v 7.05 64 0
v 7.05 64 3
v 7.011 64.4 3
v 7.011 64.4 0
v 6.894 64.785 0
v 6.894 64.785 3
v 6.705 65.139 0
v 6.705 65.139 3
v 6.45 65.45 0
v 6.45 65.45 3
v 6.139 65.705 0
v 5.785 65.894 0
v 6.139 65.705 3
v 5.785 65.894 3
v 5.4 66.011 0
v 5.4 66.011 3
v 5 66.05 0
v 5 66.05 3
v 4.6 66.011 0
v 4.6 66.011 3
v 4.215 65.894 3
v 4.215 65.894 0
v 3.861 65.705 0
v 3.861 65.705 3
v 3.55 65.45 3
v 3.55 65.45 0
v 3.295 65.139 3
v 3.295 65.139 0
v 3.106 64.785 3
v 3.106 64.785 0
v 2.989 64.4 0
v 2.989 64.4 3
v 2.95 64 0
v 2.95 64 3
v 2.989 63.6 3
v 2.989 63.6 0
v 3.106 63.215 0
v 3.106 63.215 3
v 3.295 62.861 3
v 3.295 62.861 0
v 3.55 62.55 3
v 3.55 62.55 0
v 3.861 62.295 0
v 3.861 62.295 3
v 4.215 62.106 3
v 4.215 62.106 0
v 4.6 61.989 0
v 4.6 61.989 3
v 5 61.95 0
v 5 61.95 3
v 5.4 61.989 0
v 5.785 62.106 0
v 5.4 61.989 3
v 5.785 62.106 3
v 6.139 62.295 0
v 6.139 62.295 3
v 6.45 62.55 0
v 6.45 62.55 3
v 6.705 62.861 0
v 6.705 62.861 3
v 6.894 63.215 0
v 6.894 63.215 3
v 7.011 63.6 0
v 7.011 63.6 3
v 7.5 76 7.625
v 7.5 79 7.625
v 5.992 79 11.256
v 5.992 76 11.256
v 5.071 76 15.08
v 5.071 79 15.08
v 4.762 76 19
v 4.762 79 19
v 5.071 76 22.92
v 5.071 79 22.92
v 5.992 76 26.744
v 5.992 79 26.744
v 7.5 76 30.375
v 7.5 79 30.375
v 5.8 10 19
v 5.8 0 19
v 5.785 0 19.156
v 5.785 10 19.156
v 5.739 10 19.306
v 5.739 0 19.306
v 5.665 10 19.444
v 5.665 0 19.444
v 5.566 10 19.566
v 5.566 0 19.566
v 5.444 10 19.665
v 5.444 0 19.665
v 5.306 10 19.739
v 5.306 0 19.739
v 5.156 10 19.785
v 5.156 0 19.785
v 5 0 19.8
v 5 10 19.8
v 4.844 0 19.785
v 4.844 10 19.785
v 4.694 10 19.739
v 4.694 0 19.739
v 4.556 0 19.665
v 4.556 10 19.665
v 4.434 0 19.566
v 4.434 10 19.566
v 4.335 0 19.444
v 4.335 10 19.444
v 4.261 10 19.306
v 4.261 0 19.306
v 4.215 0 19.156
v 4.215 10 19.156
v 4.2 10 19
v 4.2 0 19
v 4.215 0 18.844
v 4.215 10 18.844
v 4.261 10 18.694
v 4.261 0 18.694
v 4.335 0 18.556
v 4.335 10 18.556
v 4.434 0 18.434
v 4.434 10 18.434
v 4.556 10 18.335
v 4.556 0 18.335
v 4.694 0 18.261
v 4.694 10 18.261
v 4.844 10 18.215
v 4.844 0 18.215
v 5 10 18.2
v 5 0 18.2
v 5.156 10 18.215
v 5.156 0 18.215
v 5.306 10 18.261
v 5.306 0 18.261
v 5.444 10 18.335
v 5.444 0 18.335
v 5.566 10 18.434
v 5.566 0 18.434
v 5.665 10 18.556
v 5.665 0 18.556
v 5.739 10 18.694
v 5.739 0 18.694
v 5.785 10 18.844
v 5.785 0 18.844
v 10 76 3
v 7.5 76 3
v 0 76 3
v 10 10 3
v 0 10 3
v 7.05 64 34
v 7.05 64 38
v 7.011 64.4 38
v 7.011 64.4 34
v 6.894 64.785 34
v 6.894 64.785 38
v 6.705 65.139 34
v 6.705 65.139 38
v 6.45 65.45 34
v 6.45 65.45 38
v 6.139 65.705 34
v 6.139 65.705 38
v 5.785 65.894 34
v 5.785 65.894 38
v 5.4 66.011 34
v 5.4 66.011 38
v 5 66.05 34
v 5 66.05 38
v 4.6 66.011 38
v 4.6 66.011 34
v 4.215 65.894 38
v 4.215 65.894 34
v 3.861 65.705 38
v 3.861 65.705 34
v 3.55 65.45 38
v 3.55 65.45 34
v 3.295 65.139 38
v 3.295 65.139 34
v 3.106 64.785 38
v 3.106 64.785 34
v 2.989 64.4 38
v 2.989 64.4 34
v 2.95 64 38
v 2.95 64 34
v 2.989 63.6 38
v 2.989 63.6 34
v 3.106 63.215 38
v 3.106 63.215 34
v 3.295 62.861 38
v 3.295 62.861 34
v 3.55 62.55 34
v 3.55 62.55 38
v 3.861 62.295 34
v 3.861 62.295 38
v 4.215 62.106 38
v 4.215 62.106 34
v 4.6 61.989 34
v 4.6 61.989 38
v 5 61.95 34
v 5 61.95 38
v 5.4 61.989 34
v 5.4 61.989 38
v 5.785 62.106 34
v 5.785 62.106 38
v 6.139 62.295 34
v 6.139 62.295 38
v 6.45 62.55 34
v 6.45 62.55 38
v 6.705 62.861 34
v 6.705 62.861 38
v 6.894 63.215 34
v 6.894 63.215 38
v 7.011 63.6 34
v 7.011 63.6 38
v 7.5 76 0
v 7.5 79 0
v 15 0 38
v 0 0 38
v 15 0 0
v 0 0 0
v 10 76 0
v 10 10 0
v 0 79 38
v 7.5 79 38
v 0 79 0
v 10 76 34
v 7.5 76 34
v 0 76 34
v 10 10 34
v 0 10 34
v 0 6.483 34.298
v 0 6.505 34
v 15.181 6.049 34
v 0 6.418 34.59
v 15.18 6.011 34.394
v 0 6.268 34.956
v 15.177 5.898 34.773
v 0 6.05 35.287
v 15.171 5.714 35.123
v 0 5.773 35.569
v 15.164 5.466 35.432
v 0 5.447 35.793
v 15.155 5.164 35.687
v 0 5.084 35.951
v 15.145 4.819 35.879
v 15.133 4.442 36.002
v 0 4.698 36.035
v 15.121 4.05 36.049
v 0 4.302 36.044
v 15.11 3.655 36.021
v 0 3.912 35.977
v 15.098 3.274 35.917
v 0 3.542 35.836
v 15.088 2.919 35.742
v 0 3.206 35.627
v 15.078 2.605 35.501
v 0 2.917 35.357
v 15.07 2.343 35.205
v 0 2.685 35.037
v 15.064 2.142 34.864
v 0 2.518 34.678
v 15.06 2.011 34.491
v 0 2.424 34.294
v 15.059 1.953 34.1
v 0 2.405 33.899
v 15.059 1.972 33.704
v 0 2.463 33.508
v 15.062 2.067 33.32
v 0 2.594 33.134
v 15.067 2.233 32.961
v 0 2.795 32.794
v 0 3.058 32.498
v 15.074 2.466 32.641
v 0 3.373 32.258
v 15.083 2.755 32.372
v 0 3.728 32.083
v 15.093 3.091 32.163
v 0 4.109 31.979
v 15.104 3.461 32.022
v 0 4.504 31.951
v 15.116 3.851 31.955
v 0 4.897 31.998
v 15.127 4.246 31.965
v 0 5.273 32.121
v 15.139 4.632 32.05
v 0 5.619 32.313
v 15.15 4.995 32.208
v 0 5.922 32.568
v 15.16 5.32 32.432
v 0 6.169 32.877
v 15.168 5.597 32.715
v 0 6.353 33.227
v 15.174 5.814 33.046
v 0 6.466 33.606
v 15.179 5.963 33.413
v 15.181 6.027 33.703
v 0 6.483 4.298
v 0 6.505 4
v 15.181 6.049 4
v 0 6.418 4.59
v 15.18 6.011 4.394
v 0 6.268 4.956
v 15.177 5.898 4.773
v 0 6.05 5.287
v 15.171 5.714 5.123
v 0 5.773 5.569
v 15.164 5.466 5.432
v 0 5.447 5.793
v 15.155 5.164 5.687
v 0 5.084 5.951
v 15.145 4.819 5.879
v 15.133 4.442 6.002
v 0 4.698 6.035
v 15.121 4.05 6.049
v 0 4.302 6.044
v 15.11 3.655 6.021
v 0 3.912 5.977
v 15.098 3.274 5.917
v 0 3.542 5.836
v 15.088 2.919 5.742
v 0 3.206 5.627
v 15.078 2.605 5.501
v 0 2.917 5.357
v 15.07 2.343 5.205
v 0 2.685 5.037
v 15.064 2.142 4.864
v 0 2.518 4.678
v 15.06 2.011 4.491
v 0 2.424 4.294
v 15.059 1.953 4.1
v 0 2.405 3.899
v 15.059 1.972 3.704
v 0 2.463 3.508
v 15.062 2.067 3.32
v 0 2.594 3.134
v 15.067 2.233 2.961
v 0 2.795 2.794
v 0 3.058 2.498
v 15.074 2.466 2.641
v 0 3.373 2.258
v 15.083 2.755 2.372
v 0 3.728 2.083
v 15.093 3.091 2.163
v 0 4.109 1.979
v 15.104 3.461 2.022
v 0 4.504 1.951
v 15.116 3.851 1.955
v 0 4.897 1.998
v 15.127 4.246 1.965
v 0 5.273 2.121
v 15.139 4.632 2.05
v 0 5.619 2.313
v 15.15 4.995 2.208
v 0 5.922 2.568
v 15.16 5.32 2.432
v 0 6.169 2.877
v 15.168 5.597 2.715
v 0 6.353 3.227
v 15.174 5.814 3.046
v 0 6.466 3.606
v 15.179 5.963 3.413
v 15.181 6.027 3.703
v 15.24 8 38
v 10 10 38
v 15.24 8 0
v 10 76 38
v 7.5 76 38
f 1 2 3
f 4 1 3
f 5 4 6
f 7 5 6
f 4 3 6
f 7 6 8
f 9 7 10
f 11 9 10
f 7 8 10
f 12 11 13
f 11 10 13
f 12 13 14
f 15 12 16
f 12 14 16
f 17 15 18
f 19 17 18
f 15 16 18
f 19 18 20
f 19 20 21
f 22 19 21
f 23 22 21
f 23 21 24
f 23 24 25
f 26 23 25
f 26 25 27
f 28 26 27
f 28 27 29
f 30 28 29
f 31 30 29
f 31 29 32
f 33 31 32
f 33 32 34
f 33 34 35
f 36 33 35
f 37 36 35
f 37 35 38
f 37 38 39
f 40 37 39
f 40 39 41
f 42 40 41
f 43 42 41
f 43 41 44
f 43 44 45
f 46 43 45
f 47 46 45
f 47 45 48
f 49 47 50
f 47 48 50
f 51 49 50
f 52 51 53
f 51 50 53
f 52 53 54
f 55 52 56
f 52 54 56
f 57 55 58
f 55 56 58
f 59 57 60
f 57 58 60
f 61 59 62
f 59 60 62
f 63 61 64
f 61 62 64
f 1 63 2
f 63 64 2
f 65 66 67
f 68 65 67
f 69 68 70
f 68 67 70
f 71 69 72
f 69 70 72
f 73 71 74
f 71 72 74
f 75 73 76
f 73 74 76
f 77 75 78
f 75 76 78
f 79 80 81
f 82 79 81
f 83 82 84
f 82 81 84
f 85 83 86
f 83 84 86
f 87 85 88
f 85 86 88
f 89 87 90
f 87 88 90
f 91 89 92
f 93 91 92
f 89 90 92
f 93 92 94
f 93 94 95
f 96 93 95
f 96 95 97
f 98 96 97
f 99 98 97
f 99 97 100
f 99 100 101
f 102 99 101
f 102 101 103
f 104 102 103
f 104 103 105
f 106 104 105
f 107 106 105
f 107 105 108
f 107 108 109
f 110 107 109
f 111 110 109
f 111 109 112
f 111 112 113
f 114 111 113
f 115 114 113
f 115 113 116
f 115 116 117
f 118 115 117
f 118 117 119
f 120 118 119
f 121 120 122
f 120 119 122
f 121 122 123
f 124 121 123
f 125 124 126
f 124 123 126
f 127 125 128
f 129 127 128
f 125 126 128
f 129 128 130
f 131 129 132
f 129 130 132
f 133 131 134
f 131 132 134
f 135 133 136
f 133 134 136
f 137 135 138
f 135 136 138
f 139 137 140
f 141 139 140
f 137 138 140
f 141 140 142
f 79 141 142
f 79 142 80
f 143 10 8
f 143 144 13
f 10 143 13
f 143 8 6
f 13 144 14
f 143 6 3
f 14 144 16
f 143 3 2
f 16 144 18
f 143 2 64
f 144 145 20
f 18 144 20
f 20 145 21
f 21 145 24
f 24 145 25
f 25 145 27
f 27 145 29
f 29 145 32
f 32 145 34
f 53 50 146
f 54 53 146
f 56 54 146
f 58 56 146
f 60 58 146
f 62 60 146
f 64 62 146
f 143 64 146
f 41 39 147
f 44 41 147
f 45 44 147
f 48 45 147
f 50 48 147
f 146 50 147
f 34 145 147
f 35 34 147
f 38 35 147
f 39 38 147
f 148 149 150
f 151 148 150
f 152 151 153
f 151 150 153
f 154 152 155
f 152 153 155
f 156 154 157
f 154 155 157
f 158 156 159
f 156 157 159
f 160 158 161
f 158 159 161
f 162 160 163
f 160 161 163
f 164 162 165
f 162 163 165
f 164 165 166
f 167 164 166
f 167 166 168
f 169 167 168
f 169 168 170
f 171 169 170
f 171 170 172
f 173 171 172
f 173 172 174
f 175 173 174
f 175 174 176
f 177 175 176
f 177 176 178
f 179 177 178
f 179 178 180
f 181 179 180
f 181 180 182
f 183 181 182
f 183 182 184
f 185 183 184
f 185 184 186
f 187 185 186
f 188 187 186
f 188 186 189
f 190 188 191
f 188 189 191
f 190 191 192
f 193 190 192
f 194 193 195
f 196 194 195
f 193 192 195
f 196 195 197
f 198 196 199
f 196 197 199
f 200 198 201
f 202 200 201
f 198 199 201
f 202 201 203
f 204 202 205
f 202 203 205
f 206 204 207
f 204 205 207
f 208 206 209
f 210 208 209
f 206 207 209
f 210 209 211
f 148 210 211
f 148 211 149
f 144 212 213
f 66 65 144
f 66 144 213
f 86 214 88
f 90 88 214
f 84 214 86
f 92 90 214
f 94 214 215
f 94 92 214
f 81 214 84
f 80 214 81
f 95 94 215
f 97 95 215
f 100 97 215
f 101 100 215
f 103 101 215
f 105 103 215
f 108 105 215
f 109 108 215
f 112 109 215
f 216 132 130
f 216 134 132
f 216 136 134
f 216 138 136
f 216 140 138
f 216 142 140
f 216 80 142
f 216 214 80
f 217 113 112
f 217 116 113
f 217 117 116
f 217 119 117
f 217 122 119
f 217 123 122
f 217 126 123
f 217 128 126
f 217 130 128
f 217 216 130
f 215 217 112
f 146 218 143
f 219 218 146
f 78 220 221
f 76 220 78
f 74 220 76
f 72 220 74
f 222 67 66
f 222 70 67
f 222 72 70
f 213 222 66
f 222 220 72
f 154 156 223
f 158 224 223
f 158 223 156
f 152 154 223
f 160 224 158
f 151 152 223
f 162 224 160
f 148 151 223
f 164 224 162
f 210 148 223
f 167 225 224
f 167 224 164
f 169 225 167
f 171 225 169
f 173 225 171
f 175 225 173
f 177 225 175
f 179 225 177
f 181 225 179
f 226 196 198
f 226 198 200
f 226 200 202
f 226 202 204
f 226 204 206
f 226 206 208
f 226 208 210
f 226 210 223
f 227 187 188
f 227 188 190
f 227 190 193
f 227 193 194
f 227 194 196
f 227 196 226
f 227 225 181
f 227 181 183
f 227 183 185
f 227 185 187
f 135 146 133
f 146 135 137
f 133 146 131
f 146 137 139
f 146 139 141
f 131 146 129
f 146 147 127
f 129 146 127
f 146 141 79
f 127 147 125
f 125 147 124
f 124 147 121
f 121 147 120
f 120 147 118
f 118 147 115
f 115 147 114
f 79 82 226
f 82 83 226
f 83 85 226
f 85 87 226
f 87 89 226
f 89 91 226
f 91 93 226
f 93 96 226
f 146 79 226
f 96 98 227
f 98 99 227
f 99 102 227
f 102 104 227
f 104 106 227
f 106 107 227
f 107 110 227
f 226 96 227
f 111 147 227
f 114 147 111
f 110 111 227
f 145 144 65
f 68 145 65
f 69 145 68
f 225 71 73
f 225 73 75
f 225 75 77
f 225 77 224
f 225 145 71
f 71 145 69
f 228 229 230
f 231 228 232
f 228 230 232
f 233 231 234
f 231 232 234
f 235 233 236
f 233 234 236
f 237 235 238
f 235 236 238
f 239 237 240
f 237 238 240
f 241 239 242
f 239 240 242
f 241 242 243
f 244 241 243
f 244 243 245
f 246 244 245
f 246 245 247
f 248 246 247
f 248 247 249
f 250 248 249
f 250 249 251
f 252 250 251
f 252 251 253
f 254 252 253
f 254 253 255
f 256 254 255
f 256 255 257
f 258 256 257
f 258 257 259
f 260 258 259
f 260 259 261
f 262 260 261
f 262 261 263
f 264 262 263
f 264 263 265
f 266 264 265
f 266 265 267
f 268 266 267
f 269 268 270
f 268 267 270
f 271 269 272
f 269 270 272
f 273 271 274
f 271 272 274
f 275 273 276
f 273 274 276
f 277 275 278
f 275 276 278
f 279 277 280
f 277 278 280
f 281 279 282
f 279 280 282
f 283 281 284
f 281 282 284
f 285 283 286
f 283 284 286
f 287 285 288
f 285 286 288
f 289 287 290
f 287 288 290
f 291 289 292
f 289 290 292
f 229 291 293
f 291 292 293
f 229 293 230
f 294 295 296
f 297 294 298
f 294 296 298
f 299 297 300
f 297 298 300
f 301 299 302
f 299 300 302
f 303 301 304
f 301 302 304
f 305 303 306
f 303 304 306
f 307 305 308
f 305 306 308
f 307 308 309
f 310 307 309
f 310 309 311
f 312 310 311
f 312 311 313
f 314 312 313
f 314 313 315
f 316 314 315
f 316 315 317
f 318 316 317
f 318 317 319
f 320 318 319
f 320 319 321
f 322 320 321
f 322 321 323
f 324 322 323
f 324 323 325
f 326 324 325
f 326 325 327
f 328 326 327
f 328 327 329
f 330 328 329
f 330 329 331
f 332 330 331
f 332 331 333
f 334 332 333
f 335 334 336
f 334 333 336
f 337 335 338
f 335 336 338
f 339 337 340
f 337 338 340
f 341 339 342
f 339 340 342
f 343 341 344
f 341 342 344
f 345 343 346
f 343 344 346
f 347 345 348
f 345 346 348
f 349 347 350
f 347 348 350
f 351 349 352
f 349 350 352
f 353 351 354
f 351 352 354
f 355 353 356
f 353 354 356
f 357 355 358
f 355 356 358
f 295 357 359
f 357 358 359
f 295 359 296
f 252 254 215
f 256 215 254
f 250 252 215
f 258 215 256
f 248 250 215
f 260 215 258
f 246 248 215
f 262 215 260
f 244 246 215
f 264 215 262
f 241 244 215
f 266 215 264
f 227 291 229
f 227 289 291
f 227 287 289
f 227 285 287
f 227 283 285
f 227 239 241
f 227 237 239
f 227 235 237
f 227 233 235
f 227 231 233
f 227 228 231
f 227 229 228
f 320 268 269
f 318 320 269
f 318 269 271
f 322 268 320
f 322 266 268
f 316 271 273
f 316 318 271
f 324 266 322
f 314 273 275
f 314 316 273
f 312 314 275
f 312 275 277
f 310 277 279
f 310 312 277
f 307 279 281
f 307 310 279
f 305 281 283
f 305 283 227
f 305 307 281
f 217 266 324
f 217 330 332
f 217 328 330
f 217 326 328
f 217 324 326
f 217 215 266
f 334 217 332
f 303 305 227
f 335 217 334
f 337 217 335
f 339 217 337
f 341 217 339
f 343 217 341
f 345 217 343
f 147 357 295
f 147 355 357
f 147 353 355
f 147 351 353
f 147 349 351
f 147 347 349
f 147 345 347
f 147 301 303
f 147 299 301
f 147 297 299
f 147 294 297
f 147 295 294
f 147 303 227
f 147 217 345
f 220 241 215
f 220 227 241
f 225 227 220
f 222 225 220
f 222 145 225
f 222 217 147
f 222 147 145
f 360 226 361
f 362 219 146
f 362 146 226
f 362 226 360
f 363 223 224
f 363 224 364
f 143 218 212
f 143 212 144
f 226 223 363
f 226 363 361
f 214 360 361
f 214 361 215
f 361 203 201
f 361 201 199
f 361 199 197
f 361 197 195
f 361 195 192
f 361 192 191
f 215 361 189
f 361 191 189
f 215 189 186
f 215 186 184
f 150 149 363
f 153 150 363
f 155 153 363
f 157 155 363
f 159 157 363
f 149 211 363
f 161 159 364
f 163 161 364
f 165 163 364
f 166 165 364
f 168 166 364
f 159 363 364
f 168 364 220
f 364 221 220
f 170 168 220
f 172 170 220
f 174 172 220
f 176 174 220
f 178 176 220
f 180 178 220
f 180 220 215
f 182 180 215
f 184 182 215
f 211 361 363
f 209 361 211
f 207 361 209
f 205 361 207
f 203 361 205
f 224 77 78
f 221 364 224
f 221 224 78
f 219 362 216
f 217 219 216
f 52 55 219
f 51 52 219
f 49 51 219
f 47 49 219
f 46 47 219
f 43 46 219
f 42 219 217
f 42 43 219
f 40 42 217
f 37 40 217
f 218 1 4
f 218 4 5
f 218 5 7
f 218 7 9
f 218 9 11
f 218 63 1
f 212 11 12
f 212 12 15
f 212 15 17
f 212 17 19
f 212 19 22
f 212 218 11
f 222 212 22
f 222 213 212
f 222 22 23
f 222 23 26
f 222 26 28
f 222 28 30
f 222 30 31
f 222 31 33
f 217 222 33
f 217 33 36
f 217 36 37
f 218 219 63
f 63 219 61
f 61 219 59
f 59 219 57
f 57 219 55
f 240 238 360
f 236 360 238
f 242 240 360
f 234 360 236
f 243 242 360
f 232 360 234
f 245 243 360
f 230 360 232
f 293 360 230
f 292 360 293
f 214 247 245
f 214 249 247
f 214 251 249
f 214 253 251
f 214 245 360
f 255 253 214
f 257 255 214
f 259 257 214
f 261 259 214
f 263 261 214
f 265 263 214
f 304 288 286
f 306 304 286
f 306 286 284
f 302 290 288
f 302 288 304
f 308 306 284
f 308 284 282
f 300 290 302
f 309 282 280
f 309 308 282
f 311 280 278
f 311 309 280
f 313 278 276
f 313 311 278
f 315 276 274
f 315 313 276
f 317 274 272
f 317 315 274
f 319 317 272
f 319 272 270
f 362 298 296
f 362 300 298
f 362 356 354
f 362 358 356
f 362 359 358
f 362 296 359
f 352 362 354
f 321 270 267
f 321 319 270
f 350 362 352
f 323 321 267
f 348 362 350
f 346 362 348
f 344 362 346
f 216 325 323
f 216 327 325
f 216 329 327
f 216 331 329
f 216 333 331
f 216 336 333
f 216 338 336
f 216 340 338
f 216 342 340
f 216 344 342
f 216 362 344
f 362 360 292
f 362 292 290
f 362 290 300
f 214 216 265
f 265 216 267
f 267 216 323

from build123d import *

# Parameters (mm, degrees)
PAD_DEPTH       = 38
SKETCH001_R     = 2.05
POCKET_DEPTH    = 17.363189
SKETCH002_W     = 66
SKETCH002_H     = 31
POCKET001_DEPTH = 15.241
SKETCH003_R     = 2.05
POCKET002_DEPTH = 38.001
SKETCH004_W     = 3
SKETCH004_H     = 38
POCKET003_DEPTH = 2.5
POCKET004_DEPTH = 5
SKETCH006_R     = 0.8
POCKET005_DEPTH = 15


with BuildPart() as part:
    # Sketch → Pad (new body)
    with BuildSketch(Plane.XY):
        Polygon((15, 0), (0, 0), (0, 79), (10, 79), (10, 10), (15.24, 8), align=None)
    extrude(amount=PAD_DEPTH)

    # Sketch001 (on Face6 of Pad) → Pocket (cut, through all)
    with BuildSketch(Plane(origin=(14.986512, -0.449595, 0), x_dir=(0.029987, 0.99955, 0), z_dir=(0.99955, -0.029987, 0))):
        with Locations((4.451597, 34)):
            Circle(SKETCH001_R)
        with Locations((4.451597, 4)):
            Circle(SKETCH001_R)
    extrude(amount=-POCKET_DEPTH, mode=Mode.SUBTRACT)

    # Sketch002 (on Face3 of Pocket) → Pocket001 (cut, through all)
    with BuildSketch(Plane(origin=(0, 0, 0), x_dir=(0, -1, 0), z_dir=(-1, 0, 0))):
        with Locations((-43, 18.5)):
            Rectangle(SKETCH002_W, SKETCH002_H)
    extrude(amount=-POCKET001_DEPTH, mode=Mode.SUBTRACT)

    # Sketch003 (on Face5 of Pocket001) → Pocket002 (cut, through all)
    with BuildSketch(Plane.XY.offset(38)):
        with Locations((5, 64)):
            Circle(SKETCH003_R)
    extrude(amount=-POCKET002_DEPTH, mode=Mode.SUBTRACT)

    # Sketch004 (on Face14 of Pocket002) → Pocket003 (cut)
    with BuildSketch(Plane.YZ.offset(10)):
        with Locations((77.5, 19)):
            Rectangle(SKETCH004_W, SKETCH004_H)
    extrude(amount=-POCKET003_DEPTH, mode=Mode.SUBTRACT)

    # Sketch005 (on Face9 of Pocket003) → Pocket004 (cut)
    with BuildSketch(Plane(origin=(0, 79, 0), x_dir=(-1, 0, 0), z_dir=(0, 1, 0))):
        with BuildLine():
            ThreePointArc((-7.5, 7.624688), (-4.762126, 19), (-7.5, 30.375312))
            Line((-7.5, 7.624688), (-7.5, 30.375312))
        make_face()
    extrude(amount=-POCKET004_DEPTH, mode=Mode.SUBTRACT)

    # Sketch006 (on Face1 of Pocket004) → Pocket005 (cut)
    with BuildSketch(Plane.XZ):
        with Locations((5, 19)):
            Circle(SKETCH006_R)
    extrude(amount=-POCKET005_DEPTH, mode=Mode.SUBTRACT)


solid = part.part
